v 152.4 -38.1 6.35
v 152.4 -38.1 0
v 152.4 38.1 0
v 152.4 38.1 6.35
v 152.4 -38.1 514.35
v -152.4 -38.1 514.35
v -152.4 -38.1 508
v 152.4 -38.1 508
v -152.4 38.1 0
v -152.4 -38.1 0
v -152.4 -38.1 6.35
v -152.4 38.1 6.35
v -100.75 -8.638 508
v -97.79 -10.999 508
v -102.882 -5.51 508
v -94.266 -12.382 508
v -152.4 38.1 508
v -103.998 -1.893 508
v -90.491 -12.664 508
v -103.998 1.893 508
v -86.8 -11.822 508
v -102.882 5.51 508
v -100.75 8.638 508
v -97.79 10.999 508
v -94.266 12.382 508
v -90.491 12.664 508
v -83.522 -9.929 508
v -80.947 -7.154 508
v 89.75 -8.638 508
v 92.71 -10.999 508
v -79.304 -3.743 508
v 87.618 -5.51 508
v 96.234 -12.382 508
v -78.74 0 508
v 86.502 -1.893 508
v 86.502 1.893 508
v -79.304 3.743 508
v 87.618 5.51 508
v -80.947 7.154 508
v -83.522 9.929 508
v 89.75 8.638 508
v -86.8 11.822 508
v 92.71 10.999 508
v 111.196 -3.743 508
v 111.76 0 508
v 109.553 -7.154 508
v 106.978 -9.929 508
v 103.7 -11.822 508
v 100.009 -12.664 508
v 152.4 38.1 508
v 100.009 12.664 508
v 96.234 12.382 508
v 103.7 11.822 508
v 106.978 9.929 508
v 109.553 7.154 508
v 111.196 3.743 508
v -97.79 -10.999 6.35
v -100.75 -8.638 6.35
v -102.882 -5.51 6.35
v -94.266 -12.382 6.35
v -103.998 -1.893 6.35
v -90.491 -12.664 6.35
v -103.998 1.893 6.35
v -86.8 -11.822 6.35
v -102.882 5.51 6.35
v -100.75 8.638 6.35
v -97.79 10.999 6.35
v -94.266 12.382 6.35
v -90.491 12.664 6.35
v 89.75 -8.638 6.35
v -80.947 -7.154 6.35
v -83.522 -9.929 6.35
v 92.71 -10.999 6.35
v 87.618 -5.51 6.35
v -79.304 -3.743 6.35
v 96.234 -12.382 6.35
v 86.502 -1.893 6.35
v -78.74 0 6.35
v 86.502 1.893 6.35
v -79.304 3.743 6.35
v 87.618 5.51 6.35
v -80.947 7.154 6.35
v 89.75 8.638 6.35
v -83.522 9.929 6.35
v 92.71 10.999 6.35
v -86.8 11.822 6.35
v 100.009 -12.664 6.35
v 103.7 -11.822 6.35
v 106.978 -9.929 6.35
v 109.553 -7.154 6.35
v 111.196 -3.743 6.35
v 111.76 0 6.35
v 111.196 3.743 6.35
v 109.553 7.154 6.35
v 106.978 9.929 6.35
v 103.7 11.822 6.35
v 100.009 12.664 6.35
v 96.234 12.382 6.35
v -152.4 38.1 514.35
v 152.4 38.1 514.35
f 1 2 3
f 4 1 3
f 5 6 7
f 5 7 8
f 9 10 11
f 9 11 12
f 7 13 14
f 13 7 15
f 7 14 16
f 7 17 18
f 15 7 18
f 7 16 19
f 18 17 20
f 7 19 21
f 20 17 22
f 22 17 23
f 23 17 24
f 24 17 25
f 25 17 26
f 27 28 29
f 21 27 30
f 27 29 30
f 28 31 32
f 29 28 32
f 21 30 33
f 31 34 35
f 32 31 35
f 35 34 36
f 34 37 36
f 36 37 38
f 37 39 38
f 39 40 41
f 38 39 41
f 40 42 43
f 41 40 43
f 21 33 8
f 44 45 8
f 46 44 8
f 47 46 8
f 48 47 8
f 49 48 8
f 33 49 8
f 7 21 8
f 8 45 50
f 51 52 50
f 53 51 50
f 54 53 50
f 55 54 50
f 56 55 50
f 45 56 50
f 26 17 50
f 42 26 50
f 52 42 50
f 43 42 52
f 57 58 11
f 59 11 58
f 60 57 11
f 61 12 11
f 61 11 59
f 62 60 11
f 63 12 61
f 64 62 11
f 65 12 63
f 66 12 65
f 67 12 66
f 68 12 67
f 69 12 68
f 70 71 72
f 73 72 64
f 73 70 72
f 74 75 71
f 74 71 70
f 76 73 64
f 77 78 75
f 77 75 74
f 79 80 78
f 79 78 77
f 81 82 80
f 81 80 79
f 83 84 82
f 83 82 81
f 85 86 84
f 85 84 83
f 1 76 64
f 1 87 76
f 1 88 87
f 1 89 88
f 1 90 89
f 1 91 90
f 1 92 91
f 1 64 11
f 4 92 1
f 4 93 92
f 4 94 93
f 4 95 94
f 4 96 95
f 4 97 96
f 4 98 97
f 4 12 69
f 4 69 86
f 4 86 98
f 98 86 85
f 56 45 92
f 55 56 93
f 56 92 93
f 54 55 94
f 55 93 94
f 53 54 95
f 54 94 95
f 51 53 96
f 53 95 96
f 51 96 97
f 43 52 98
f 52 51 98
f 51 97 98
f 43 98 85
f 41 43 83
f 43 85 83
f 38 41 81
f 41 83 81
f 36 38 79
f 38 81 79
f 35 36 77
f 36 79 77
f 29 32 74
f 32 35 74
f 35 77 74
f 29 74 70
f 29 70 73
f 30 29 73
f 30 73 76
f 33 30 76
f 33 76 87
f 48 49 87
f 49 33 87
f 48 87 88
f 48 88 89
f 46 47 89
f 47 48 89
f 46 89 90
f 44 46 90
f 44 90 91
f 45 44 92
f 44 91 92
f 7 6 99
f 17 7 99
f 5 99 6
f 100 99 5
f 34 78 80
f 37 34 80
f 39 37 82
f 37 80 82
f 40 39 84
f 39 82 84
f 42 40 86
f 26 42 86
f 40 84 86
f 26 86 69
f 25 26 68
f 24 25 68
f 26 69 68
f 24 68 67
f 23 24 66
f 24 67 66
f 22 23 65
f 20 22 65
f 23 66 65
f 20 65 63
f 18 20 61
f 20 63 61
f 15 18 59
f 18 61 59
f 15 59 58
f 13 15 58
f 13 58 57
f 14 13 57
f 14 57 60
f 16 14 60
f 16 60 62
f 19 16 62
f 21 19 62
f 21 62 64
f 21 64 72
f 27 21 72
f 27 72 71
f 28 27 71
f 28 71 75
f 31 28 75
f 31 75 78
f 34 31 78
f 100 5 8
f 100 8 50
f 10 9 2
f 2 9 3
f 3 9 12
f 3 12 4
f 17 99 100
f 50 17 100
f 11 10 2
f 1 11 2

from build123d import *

# Parameters (mm, degrees)
F0_W     = 304.8
F0_H     = 76.2
F1_DEPTH = 6.35
F2_R     = 12.7
F3_DEPTH = 508
F4_W     = 304.8
F4_H     = 76.2
F4_R     = 12.7
F5_DEPTH = 6.35


with BuildPart() as f1:
    # F0 (on Top) → F1 (new body)
    with BuildSketch(Plane.XY):
        Rectangle(F0_W, F0_H)
    extrude(amount=F1_DEPTH)

    # F2 (on face) → F3 (join)
    with BuildSketch(Plane.XY.offset(6.35)):
        with Locations((-91.44, 0)):
            Circle(F2_R)
        with Locations((99.06, 0)):
            Circle(F2_R)
    extrude(amount=F3_DEPTH)

    # F4 (on face) → F5 (join)
    with BuildSketch(Plane.XY.offset(514.35)):
        Rectangle(F4_W, F4_H)
        with Locations((-91.44, 0)):
            Circle(F4_R, mode=Mode.SUBTRACT)
    extrude(amount=-F5_DEPTH)


solid = f1.part
